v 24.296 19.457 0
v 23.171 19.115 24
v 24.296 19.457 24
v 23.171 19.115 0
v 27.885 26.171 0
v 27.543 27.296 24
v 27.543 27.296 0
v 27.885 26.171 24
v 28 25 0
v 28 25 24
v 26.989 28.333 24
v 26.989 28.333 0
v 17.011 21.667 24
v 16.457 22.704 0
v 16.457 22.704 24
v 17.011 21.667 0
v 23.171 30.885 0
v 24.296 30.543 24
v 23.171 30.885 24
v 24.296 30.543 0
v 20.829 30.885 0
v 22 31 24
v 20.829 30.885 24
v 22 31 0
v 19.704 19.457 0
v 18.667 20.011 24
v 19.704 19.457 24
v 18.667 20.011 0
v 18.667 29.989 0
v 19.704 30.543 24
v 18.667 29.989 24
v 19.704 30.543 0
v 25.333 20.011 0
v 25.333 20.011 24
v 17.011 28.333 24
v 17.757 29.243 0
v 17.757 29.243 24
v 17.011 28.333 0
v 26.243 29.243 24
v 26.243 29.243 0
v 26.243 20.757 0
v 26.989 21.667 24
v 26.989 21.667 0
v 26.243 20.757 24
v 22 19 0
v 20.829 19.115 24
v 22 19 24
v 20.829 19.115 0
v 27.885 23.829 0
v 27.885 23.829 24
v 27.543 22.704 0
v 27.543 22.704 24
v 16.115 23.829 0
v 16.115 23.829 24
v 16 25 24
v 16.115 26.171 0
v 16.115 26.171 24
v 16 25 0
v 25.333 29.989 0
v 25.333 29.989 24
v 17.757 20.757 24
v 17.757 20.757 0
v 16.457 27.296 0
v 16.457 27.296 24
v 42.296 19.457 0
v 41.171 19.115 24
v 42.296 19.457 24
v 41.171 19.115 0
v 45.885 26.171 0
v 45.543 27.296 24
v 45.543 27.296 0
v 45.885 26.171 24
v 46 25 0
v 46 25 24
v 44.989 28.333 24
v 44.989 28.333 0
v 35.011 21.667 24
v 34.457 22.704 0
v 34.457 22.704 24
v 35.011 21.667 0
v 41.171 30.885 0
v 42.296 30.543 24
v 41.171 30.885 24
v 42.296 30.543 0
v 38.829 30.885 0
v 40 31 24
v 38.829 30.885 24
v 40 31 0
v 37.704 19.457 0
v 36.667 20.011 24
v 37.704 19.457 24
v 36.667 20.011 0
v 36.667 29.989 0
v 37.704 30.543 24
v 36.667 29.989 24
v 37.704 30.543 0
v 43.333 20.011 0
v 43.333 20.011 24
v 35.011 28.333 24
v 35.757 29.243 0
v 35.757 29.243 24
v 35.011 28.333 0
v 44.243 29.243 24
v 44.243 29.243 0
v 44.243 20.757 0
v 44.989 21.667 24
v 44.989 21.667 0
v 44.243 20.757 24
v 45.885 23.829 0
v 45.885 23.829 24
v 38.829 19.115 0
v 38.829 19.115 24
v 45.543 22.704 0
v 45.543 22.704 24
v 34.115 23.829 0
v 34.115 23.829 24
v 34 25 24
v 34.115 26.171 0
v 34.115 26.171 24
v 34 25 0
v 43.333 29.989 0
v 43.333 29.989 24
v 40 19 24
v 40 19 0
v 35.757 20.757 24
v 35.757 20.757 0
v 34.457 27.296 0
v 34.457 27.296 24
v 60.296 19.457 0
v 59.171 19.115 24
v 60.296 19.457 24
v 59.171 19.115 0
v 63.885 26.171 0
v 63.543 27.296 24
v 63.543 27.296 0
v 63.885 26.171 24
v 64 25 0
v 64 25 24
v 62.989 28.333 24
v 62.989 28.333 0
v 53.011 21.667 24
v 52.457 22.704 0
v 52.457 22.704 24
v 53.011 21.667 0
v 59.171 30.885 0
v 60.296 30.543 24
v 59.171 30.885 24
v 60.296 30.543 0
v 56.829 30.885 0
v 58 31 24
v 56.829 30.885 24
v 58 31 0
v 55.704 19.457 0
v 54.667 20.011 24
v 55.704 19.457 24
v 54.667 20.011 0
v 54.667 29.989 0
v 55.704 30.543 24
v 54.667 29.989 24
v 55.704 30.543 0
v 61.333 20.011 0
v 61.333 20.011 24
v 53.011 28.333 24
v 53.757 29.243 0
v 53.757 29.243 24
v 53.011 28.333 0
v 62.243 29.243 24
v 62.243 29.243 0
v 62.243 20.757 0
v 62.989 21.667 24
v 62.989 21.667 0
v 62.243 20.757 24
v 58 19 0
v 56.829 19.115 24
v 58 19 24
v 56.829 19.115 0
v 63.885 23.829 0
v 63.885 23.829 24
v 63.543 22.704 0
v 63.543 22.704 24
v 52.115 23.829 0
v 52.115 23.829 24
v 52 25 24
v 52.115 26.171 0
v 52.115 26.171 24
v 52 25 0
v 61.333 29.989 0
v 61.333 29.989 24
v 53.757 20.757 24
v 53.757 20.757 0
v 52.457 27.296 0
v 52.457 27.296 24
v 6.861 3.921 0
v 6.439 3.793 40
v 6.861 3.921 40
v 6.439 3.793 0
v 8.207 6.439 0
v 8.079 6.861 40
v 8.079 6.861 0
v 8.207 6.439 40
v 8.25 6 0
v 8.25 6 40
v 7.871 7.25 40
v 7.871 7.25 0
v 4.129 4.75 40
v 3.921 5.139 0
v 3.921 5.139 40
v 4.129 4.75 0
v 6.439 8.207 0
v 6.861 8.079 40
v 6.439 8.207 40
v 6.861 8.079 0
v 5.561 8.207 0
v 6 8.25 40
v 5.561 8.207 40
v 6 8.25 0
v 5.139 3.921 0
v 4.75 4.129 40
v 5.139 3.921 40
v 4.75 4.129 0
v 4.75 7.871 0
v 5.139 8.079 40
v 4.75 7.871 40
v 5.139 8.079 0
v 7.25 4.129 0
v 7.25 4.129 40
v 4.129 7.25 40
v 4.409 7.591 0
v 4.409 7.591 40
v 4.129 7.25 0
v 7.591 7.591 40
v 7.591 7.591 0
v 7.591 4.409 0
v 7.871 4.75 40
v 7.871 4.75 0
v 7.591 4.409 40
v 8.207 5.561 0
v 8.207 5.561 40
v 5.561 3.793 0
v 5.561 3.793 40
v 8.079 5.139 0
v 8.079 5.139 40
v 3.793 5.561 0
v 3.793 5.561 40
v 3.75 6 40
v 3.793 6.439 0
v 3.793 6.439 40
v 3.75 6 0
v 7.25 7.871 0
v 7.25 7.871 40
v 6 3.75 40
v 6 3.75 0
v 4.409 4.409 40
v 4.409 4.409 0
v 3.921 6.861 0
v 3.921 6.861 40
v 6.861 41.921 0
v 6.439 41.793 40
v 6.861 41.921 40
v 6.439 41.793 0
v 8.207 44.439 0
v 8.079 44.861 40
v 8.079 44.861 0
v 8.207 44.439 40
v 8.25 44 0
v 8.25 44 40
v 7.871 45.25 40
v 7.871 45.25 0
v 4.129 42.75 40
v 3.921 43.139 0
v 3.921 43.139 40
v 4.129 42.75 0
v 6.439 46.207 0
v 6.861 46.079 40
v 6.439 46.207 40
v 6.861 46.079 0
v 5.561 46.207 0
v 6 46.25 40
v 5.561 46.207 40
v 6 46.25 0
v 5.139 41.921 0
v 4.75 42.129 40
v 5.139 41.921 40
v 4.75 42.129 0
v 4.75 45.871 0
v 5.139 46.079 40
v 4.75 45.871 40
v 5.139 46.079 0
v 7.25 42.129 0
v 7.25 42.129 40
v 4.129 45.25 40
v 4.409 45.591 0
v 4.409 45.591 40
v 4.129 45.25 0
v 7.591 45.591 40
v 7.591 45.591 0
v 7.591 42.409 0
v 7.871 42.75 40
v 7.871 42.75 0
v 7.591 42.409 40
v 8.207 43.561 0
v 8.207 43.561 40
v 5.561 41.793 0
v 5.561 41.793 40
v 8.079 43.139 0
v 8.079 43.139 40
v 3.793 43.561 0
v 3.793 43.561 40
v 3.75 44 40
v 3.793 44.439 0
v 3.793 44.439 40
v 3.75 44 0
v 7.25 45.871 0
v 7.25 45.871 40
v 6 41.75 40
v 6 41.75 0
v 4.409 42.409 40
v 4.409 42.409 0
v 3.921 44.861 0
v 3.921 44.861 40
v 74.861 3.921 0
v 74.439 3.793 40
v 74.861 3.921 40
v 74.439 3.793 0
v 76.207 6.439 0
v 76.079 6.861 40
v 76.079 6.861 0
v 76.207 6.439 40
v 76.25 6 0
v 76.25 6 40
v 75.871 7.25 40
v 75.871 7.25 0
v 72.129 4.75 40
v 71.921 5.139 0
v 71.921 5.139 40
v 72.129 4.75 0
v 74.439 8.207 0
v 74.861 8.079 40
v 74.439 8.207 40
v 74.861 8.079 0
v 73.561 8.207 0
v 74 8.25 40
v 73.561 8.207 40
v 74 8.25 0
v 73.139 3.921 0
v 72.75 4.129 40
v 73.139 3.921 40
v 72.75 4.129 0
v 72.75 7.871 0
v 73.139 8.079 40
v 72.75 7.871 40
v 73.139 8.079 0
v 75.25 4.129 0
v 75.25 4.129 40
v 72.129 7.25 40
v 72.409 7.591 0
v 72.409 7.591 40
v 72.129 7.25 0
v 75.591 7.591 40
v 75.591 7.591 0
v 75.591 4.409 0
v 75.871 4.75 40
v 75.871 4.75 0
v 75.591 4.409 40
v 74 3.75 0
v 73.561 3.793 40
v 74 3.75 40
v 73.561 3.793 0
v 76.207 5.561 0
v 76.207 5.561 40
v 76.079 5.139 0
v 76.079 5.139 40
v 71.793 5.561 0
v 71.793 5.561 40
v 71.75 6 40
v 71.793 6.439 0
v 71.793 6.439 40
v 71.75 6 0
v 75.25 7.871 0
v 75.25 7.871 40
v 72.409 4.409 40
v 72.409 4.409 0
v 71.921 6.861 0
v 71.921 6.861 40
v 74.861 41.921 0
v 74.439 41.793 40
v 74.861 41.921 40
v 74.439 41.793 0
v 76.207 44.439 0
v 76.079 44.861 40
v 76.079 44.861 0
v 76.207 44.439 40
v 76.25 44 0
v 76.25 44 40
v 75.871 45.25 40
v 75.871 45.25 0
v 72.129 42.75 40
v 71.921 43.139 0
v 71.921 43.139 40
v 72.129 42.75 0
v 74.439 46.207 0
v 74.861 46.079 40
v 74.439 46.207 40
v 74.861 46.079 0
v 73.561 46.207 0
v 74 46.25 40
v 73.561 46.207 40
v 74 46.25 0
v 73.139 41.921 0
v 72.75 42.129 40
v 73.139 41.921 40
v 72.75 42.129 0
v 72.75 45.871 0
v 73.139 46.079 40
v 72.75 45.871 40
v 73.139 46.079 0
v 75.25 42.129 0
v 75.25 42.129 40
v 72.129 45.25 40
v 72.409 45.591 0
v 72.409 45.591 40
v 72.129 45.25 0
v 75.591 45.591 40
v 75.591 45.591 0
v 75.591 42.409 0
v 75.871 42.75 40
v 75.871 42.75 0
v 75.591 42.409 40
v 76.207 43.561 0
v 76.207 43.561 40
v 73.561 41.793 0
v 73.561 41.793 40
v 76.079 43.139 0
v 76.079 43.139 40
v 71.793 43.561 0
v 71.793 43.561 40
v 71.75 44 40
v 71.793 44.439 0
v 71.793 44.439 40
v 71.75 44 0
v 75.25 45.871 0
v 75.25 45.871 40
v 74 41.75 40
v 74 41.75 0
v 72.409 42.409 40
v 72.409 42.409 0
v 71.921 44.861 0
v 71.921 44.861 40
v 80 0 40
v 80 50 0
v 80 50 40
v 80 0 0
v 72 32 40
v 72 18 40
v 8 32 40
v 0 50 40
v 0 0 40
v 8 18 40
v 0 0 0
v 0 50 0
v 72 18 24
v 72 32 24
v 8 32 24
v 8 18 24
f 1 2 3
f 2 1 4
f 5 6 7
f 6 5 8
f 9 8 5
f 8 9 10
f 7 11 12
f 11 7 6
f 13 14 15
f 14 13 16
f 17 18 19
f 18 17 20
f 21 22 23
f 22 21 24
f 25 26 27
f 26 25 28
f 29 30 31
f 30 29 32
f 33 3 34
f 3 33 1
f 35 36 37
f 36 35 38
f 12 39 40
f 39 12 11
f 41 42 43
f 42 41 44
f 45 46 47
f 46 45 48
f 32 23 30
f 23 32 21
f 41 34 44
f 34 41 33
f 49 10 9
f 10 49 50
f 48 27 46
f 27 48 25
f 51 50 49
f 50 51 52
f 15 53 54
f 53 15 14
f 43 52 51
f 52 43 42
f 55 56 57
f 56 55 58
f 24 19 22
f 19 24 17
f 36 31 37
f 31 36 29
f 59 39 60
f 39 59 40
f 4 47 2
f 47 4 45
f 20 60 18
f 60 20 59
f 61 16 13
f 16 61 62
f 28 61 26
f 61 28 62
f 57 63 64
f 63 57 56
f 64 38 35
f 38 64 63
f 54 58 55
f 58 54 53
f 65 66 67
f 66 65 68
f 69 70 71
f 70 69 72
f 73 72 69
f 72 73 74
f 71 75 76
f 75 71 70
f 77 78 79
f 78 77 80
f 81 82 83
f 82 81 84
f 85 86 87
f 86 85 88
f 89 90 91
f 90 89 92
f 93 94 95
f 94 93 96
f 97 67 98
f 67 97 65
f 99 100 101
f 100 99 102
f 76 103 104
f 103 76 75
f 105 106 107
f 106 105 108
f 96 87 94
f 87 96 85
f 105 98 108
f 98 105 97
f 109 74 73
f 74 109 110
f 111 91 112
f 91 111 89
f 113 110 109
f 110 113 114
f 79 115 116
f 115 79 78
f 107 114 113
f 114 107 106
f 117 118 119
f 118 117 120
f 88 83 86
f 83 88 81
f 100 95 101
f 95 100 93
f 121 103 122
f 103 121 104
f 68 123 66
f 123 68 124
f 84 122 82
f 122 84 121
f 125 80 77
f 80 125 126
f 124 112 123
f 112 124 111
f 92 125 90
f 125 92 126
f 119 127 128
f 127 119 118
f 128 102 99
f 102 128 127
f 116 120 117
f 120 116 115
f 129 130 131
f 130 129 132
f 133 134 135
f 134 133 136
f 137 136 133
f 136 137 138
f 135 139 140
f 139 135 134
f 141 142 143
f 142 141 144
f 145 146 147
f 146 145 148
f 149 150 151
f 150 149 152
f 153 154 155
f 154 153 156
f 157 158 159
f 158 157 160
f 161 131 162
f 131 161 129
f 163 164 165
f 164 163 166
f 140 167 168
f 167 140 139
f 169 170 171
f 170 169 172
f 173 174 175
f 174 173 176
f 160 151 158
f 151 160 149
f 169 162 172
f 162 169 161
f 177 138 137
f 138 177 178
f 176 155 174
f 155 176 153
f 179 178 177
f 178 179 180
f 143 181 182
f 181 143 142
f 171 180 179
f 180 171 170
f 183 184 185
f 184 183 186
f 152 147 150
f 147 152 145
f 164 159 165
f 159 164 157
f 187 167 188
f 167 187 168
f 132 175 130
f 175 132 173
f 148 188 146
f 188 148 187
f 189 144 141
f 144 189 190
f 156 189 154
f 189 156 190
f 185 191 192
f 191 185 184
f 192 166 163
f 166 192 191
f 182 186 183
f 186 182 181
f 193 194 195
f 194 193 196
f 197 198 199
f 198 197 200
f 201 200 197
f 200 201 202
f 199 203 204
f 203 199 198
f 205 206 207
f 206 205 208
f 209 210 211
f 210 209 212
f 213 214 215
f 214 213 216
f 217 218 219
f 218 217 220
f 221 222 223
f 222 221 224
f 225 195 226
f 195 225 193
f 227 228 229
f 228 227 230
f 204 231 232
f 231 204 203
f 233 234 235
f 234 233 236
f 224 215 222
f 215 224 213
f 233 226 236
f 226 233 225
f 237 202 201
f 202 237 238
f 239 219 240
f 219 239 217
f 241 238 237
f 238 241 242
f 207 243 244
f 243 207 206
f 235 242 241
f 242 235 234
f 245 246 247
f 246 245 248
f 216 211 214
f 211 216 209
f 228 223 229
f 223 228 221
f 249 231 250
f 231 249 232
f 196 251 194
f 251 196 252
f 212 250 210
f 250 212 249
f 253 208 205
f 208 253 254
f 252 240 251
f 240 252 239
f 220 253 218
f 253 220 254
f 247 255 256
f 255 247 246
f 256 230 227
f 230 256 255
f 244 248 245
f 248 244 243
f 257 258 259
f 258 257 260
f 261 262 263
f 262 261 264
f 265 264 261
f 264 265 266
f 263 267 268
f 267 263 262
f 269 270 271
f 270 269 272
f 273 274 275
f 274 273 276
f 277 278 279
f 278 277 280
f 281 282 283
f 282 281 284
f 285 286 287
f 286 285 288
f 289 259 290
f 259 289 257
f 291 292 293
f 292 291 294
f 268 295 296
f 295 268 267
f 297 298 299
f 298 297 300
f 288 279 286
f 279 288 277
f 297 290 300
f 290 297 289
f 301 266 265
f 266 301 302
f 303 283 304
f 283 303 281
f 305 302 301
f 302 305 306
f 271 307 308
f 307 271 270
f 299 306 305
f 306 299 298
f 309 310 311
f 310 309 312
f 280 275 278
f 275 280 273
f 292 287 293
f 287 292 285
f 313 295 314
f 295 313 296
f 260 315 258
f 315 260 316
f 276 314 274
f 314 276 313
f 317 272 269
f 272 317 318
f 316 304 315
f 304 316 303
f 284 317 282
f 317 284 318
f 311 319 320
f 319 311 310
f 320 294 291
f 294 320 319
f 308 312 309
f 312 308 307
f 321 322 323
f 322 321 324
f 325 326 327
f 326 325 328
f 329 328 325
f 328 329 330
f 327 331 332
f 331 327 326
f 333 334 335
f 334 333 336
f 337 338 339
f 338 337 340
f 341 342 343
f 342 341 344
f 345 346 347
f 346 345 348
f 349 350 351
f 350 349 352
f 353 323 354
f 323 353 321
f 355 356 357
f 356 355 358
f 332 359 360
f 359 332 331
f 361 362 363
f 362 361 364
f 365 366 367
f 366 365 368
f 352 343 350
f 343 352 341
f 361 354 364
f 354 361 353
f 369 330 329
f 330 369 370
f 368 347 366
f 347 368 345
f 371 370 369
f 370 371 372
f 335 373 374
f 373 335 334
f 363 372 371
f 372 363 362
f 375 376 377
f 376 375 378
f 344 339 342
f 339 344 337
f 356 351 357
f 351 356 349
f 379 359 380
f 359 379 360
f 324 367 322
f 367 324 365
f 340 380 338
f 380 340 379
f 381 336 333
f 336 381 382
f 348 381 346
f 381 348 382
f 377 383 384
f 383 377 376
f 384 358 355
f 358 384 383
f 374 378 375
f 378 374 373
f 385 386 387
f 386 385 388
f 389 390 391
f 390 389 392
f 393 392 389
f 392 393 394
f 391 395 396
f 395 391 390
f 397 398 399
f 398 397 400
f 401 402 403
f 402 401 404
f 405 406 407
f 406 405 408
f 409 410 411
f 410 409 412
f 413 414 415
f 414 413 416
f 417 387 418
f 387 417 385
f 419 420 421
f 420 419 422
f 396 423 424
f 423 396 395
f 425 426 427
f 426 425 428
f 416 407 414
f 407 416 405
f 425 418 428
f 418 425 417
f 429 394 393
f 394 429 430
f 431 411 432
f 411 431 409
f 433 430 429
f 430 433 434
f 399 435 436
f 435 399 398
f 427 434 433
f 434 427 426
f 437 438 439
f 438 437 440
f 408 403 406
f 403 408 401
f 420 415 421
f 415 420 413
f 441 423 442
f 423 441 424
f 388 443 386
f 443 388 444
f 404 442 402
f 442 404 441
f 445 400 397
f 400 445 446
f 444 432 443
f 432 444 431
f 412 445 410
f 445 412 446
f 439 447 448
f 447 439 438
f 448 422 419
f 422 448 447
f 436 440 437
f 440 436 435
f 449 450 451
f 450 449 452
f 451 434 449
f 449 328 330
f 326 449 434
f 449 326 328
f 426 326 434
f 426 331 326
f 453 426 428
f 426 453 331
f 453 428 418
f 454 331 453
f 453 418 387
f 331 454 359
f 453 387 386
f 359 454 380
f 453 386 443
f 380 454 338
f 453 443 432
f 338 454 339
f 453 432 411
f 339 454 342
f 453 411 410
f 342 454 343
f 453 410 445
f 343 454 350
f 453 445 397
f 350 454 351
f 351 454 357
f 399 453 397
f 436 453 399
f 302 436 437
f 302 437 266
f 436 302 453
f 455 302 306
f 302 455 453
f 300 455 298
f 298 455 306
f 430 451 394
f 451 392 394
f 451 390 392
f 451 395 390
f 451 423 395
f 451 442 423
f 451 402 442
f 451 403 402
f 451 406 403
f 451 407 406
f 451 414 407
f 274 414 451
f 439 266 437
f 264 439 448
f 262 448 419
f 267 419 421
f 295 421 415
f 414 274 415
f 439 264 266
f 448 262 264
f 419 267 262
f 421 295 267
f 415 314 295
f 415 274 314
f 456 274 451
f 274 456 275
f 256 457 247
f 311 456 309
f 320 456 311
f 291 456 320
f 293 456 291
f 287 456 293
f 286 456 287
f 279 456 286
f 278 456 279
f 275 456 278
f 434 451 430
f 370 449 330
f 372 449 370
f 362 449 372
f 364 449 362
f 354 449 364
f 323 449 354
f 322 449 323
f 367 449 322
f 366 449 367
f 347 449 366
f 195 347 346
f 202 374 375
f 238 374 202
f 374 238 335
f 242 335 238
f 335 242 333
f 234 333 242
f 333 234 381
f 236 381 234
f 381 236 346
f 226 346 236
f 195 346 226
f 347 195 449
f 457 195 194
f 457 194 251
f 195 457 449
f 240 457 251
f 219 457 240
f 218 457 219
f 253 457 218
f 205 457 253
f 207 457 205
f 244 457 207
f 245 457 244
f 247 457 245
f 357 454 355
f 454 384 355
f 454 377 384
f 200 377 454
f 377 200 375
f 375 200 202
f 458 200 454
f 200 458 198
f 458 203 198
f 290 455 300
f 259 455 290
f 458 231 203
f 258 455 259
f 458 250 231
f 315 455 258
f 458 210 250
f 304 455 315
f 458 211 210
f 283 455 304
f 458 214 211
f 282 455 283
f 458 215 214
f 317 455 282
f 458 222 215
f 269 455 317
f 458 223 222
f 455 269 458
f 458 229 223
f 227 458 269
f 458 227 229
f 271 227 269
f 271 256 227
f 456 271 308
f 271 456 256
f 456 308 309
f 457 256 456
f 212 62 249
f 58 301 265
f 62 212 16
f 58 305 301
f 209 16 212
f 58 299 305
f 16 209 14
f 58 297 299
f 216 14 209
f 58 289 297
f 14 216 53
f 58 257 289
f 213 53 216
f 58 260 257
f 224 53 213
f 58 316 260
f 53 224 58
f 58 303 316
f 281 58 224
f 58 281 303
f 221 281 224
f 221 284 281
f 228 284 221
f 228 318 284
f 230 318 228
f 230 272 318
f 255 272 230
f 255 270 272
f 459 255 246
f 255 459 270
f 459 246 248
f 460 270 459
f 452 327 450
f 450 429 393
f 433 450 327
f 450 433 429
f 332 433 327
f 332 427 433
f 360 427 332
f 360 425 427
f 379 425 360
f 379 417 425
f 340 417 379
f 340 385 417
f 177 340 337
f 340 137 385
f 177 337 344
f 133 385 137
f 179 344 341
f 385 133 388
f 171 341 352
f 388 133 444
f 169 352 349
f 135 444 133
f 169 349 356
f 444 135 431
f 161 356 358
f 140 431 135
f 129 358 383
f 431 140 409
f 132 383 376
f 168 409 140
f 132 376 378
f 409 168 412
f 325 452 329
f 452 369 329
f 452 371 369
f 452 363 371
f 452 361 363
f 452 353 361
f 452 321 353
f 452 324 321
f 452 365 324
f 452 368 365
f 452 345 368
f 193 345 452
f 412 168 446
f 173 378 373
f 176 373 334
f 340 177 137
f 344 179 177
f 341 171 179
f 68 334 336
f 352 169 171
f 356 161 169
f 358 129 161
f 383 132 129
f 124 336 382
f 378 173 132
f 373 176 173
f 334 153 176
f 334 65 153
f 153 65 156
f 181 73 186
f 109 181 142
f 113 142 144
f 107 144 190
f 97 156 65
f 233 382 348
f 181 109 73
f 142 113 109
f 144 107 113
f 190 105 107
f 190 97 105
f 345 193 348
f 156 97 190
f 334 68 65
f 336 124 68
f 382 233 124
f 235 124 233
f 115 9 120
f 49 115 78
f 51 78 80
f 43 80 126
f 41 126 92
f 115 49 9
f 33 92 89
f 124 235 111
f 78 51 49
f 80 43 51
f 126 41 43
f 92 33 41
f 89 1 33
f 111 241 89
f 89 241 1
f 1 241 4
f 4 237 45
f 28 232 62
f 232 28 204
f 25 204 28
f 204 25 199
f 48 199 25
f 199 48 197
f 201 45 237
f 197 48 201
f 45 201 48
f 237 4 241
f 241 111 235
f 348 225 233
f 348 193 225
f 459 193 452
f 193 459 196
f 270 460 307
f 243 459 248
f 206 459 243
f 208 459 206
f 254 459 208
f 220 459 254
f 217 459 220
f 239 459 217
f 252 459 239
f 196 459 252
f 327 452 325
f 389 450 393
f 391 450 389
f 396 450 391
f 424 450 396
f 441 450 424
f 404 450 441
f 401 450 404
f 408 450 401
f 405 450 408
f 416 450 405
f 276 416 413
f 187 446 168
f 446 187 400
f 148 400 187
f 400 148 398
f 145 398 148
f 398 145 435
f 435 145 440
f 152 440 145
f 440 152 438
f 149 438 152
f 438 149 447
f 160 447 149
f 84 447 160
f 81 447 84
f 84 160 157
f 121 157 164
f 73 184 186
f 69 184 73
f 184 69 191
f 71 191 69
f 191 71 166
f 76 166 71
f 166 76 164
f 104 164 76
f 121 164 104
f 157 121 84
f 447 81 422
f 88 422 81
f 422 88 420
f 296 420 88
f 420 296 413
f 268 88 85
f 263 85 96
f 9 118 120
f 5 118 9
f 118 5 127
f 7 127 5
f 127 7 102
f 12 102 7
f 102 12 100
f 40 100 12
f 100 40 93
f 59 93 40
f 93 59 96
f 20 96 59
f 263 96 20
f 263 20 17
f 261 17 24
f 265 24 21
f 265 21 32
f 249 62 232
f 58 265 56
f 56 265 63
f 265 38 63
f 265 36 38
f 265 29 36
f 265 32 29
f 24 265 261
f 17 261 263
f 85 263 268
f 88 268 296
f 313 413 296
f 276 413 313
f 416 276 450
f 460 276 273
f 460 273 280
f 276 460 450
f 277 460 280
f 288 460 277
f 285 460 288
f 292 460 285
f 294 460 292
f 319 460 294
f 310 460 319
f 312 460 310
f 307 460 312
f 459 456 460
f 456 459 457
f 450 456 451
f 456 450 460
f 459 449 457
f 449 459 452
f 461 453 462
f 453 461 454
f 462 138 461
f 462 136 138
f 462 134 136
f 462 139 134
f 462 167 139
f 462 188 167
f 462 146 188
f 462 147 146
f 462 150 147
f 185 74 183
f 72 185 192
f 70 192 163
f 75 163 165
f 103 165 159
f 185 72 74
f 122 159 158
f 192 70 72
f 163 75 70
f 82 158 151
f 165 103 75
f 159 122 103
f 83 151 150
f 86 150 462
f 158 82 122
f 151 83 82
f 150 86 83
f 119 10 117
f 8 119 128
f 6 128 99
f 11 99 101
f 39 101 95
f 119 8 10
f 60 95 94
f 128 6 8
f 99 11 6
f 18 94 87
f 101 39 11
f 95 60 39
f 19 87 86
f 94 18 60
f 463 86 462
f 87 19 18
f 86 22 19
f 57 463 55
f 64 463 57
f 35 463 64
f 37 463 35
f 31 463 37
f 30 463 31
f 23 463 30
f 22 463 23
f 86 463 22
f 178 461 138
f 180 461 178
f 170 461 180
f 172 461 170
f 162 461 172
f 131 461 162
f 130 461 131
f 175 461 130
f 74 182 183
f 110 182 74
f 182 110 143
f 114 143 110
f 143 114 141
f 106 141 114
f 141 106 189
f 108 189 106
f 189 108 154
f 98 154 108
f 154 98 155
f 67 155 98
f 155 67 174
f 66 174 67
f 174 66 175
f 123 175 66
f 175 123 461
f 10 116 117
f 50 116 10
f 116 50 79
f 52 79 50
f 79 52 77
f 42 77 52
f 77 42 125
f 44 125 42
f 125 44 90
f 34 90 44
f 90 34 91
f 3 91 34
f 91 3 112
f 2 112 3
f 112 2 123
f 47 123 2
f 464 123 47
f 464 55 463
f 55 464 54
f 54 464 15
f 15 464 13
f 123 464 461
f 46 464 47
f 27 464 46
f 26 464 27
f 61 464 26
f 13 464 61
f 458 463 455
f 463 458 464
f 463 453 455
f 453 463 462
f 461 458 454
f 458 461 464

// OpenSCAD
$fn = 32;

// ----------------------------------------------------------------------
// Manifold block: gallery_top manifold
// ----------------------------------------------------------------------

// --- parameters (mm) ---
block_l = 80;             // block length, X
block_w = 50;             // block width, Y
block_h = 40;             // block height, Z
port_d = 12;              // port bore diameter
port_pitch = 18;          // port pitch along X
gallery_d = 14;           // top gallery width, Y
gallery_depth = 16;       // gallery pocket depth
wall_p = 8;               // gallery end wall thickness, X
mnt_d = 4.5;              // mounting hole diameter
mnt_in = 6;               // mounting hole inset from the edges

n_ports = 3;  // ports in the row
port_x0 = (block_l - (n_ports - 1) * port_pitch) / 2;  // first port X

difference() {
  cube([block_l, block_w, block_h]);
  for (i = [0 : n_ports - 1])
    translate([port_x0 + i * port_pitch, block_w / 2, -1])
      cylinder(h = block_h + 2, d = port_d);
  translate([wall_p, block_w / 2 - gallery_d / 2, block_h - gallery_depth])
    cube([block_l - 2 * wall_p, gallery_d, gallery_depth + 1]);
  for (cx = [mnt_in, block_l - mnt_in])
    for (cy = [mnt_in, block_w - mnt_in])
      translate([cx, cy, -1]) cylinder(h = block_h + 2, d = mnt_d);
}
